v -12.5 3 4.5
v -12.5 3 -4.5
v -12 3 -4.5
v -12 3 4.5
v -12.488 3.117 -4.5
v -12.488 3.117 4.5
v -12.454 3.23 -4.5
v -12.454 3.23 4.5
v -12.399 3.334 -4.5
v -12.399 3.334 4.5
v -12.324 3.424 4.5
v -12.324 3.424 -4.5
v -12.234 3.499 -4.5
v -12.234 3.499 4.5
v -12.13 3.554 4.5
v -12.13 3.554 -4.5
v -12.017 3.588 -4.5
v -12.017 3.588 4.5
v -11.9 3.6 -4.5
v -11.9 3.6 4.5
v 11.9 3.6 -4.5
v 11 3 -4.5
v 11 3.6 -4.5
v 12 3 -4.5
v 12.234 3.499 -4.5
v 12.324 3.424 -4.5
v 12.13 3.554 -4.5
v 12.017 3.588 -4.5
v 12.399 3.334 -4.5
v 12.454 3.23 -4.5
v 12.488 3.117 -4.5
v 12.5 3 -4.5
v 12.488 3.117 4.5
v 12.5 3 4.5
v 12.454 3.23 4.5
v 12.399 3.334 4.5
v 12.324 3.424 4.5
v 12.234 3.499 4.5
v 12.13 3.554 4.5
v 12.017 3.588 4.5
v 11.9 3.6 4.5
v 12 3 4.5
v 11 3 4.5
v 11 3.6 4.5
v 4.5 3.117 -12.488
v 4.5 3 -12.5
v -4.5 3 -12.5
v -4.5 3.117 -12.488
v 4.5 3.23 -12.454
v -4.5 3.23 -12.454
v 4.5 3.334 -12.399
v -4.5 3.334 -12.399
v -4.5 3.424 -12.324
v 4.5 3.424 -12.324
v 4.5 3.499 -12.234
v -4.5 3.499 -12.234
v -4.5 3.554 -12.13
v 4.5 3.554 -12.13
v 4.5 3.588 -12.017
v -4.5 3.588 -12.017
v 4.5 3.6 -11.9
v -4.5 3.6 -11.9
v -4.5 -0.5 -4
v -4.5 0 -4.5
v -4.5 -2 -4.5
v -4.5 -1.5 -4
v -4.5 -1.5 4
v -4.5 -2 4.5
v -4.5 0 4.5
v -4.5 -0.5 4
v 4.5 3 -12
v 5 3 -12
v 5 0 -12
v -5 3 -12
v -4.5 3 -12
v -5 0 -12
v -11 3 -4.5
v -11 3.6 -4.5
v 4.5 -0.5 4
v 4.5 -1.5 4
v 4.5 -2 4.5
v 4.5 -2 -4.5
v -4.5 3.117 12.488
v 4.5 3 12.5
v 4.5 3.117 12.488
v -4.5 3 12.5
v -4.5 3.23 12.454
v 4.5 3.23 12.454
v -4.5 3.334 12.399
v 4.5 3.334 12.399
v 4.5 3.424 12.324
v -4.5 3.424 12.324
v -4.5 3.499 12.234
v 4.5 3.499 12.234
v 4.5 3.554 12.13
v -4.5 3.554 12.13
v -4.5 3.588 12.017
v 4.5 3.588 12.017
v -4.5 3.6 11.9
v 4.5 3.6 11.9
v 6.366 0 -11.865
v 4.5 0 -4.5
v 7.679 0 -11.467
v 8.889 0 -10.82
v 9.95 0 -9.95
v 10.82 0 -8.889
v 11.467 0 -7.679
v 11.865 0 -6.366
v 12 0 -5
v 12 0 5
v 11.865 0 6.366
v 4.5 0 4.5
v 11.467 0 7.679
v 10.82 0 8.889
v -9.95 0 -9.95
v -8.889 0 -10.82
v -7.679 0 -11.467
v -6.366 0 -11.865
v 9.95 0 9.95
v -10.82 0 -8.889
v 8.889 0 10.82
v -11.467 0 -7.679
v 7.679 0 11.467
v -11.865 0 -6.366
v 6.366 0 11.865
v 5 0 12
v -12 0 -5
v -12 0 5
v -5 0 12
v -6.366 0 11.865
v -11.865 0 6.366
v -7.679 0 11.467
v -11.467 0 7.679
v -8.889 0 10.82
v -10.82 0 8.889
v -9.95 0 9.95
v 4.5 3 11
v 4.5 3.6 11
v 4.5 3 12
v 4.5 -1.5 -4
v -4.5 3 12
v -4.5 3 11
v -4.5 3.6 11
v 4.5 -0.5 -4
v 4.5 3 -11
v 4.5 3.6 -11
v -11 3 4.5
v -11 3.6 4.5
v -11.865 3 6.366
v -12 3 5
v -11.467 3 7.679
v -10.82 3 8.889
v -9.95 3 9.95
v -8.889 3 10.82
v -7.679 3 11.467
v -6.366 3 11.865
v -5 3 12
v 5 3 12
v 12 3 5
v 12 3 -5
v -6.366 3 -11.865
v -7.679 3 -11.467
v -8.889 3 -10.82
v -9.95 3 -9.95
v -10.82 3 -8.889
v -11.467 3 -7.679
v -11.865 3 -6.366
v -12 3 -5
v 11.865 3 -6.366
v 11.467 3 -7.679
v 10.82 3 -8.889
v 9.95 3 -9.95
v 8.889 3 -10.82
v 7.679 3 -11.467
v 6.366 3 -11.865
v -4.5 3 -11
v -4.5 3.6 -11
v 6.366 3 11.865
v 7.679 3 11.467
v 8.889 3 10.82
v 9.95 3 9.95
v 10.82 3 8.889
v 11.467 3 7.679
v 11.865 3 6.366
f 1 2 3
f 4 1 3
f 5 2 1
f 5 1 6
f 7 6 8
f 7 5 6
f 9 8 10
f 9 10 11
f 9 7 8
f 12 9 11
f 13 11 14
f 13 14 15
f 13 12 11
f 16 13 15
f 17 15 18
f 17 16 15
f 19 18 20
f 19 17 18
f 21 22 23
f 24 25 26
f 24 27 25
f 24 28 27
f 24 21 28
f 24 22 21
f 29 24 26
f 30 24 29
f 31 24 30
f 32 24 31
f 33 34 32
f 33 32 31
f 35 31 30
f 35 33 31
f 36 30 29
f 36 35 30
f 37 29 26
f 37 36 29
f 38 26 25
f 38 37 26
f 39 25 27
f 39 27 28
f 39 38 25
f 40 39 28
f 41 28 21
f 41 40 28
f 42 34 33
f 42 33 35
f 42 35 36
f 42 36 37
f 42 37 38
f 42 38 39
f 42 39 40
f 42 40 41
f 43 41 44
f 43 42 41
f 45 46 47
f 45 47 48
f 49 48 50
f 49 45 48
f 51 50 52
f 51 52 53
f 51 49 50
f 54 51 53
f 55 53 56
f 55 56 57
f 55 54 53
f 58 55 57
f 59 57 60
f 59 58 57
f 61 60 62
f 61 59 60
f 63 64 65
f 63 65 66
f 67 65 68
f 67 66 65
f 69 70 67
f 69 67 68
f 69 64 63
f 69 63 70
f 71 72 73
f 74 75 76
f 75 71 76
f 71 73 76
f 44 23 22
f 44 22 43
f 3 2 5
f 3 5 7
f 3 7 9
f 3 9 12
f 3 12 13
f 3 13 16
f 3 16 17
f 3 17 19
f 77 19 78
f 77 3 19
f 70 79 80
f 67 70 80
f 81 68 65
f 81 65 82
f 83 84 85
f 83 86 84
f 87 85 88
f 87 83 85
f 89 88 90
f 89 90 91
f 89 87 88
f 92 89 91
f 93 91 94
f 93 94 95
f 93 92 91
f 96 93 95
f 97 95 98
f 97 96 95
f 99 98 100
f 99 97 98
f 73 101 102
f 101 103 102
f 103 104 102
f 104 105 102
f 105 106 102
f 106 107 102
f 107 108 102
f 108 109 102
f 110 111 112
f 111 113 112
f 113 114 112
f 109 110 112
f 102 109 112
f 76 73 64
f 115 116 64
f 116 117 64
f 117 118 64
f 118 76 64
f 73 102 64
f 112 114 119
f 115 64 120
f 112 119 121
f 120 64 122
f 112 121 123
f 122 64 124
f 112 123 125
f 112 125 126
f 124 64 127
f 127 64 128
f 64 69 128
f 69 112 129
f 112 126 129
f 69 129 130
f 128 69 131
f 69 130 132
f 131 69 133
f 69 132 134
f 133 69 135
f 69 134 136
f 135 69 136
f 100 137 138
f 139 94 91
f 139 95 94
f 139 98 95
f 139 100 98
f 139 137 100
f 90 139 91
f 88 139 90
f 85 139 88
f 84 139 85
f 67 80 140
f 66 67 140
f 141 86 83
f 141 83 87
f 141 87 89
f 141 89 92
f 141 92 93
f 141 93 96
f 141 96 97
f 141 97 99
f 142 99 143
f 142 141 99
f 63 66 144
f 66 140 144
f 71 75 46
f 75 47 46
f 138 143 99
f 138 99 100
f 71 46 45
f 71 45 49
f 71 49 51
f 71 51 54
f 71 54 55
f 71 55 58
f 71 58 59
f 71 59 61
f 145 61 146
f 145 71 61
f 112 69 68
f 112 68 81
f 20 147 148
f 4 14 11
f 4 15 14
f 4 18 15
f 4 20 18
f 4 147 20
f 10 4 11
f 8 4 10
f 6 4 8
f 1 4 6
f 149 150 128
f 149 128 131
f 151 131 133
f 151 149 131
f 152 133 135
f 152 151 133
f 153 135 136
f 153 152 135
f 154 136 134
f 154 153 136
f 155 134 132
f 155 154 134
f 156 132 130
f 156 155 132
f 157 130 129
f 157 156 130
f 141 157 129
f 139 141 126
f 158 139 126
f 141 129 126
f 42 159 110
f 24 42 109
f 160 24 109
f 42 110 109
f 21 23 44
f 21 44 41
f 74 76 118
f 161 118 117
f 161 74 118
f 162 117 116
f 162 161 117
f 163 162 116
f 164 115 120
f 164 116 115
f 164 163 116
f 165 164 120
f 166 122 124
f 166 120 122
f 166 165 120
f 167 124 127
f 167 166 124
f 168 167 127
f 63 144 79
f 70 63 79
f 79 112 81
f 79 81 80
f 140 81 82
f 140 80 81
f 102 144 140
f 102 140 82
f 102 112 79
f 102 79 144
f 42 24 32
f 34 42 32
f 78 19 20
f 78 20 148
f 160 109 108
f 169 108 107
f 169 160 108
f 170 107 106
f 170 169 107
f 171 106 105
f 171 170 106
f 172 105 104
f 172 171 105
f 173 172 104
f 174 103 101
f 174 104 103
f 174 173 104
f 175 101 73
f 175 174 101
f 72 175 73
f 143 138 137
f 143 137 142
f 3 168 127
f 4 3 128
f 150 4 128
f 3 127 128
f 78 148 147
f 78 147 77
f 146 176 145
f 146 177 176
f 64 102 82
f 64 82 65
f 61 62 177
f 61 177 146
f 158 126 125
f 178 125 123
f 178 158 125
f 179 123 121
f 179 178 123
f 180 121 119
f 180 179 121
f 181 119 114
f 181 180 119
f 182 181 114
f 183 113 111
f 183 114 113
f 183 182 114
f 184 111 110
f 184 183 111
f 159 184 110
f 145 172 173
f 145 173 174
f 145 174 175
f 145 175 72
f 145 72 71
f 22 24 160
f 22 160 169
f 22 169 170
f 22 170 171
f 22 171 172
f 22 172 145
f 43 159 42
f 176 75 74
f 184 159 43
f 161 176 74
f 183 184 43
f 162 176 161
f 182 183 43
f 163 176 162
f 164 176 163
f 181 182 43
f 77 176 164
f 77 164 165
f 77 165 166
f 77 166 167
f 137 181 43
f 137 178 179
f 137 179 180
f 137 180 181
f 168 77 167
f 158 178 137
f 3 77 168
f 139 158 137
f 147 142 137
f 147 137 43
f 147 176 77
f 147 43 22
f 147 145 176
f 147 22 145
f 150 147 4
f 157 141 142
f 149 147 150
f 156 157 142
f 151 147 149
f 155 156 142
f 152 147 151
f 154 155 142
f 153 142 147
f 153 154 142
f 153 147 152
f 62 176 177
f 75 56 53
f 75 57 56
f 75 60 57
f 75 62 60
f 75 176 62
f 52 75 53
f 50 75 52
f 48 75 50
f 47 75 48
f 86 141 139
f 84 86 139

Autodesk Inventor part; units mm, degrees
ref_plane "YZ Plane" through (0, 0, 0) normal (1, 0, 0) x (0, 1, 0)
ref_plane "XZ Plane" through (0, 0, 0) normal (0, 1, 0) x (-1, 0, 0)
ref_plane "XY Plane" through (0, 0, 0) normal (0, 0, 1) x (1, 0, 0)
sketch "스케치1" plane through (0, 0, 0) normal (0, 1, 0) x (-1, 0, 0)
  line L0 (12, 12) -> (-12, 12)
  line L1 (-12, 12) -> (-12, -12)
  line L2 (-12, -12) -> (12, -12)
  line L3 (12, -12) -> (12, 12)
  point P0 (0, 0)
  dimension "d0" = 24
  dimension "d1" = 24
  dimension "d2" = 12
  dimension "d3" = 12
extrude "돌출1" add sketch "스케치1" along normal blind 3
fillet "모깎기1" radius 7 4 edges at (-12, 1.5, 12) (12, 1.5, 12) (12, 1.5, -12) (-12, 1.5, -12)
sketch "스케치2" plane through (0, 3, 0) normal (0, 1, 0) x (1, 0, 0)
  line L0 (12.5, -4.5) -> (-12.5, -4.5)
  line L1 (-12.5, -4.5) -> (-12.5, 4.5)
  line L2 (-12.5, 4.5) -> (12.5, 4.5)
  line L3 (12.5, 4.5) -> (12.5, -4.5)
  line L4 (4.5, -12.5) -> (-4.5, -12.5)
  line L5 (-4.5, -12.5) -> (-4.5, 12.5)
  line L6 (-4.5, 12.5) -> (4.5, 12.5)
  line L7 (4.5, 12.5) -> (4.5, -12.5)
  point P0 (0, 0)
  point P1 (-4.5, -4.5)
  point P2 (-4.5, 4.5)
  point P3 (4.5, -4.5)
  point P4 (4.5, 4.5)
  dimension "d7" = 25
  dimension "d8" = 9
  dimension "d9" = 4.5
  dimension "d10" = 12.5
  dimension "d11" = 9
  dimension "d12" = 25
  dimension "d13" = 12.5
  dimension "d14" = 4.5
extrude "돌출2" add sketch "스케치2" along normal blind 0.6 contours L0 L7 L2 L3 | L7 L4 L5 L0 | L0 L1 L2 L5 | L2 L5 L6 L7
fillet "모깎기2" radius 0.6 4 edges at (12.5, 3.6, 0) (0, 3.6, -12.5) (-12.5, 3.6, 0) (0, 3.6, 12.5)
sketch "스케치3" plane through (0, 3.6, 0) normal (0, 1, 0) x (1, 0, 0)
  line L0 (11, -11) -> (-11, -11)
  line L1 (-11, -11) -> (-11, 11)
  line L2 (-11, 11) -> (11, 11)
  line L3 (11, 11) -> (11, -11)
  point P0 (0, 0)
  dimension "d18" = 22
  dimension "d19" = 22
  dimension "d20" = 11
  dimension "d21" = 11
extrude "돌출3" cut sketch "스케치3" against normal blind 0.6
sketch "스케치4" plane through (0, 0, 0) normal (0, -1, 0) x (1, 0, 0)
  line L0 (-4.5, 4.5) -> (4.5, 4.5)
  line L1 (4.5, 4.5) -> (4.5, -4.5)
  line L2 (4.5, -4.5) -> (-4.5, -4.5)
  line L3 (-4.5, -4.5) -> (-4.5, 4.5)
  point P0 (0, 0)
  dimension "d24" = 9
  dimension "d25" = 9
  dimension "d26" = 4.5
  dimension "d27" = 4.5
extrude "돌출4" add sketch "스케치4" along normal blind 2
sketch "스케치5" plane through (4.5, 0, 4.5) normal (1, 0, 0) x (0, 0, -1)
  line L0 (0.5, -1.5) -> (8.5, -1.5)
  line L1 (8.5, -1.5) -> (8.5, -0.5)
  line L2 (8.5, -0.5) -> (0.5, -0.5)
  line L3 (0.5, -0.5) -> (0.5, -1.5)
  line L4 (0, 0) -> (0, -2) projected
  line L5 (9, -2) -> (0, -2) projected
  point P0 (4.5, 0)
  dimension "d30" = 8
  dimension "d31" = 1
  dimension "d32" = 0.5
  dimension "d33" = 0.5
extrude "돌출5" cut sketch "스케치5" against normal through all
properties part number "moving_switch(bottom"
